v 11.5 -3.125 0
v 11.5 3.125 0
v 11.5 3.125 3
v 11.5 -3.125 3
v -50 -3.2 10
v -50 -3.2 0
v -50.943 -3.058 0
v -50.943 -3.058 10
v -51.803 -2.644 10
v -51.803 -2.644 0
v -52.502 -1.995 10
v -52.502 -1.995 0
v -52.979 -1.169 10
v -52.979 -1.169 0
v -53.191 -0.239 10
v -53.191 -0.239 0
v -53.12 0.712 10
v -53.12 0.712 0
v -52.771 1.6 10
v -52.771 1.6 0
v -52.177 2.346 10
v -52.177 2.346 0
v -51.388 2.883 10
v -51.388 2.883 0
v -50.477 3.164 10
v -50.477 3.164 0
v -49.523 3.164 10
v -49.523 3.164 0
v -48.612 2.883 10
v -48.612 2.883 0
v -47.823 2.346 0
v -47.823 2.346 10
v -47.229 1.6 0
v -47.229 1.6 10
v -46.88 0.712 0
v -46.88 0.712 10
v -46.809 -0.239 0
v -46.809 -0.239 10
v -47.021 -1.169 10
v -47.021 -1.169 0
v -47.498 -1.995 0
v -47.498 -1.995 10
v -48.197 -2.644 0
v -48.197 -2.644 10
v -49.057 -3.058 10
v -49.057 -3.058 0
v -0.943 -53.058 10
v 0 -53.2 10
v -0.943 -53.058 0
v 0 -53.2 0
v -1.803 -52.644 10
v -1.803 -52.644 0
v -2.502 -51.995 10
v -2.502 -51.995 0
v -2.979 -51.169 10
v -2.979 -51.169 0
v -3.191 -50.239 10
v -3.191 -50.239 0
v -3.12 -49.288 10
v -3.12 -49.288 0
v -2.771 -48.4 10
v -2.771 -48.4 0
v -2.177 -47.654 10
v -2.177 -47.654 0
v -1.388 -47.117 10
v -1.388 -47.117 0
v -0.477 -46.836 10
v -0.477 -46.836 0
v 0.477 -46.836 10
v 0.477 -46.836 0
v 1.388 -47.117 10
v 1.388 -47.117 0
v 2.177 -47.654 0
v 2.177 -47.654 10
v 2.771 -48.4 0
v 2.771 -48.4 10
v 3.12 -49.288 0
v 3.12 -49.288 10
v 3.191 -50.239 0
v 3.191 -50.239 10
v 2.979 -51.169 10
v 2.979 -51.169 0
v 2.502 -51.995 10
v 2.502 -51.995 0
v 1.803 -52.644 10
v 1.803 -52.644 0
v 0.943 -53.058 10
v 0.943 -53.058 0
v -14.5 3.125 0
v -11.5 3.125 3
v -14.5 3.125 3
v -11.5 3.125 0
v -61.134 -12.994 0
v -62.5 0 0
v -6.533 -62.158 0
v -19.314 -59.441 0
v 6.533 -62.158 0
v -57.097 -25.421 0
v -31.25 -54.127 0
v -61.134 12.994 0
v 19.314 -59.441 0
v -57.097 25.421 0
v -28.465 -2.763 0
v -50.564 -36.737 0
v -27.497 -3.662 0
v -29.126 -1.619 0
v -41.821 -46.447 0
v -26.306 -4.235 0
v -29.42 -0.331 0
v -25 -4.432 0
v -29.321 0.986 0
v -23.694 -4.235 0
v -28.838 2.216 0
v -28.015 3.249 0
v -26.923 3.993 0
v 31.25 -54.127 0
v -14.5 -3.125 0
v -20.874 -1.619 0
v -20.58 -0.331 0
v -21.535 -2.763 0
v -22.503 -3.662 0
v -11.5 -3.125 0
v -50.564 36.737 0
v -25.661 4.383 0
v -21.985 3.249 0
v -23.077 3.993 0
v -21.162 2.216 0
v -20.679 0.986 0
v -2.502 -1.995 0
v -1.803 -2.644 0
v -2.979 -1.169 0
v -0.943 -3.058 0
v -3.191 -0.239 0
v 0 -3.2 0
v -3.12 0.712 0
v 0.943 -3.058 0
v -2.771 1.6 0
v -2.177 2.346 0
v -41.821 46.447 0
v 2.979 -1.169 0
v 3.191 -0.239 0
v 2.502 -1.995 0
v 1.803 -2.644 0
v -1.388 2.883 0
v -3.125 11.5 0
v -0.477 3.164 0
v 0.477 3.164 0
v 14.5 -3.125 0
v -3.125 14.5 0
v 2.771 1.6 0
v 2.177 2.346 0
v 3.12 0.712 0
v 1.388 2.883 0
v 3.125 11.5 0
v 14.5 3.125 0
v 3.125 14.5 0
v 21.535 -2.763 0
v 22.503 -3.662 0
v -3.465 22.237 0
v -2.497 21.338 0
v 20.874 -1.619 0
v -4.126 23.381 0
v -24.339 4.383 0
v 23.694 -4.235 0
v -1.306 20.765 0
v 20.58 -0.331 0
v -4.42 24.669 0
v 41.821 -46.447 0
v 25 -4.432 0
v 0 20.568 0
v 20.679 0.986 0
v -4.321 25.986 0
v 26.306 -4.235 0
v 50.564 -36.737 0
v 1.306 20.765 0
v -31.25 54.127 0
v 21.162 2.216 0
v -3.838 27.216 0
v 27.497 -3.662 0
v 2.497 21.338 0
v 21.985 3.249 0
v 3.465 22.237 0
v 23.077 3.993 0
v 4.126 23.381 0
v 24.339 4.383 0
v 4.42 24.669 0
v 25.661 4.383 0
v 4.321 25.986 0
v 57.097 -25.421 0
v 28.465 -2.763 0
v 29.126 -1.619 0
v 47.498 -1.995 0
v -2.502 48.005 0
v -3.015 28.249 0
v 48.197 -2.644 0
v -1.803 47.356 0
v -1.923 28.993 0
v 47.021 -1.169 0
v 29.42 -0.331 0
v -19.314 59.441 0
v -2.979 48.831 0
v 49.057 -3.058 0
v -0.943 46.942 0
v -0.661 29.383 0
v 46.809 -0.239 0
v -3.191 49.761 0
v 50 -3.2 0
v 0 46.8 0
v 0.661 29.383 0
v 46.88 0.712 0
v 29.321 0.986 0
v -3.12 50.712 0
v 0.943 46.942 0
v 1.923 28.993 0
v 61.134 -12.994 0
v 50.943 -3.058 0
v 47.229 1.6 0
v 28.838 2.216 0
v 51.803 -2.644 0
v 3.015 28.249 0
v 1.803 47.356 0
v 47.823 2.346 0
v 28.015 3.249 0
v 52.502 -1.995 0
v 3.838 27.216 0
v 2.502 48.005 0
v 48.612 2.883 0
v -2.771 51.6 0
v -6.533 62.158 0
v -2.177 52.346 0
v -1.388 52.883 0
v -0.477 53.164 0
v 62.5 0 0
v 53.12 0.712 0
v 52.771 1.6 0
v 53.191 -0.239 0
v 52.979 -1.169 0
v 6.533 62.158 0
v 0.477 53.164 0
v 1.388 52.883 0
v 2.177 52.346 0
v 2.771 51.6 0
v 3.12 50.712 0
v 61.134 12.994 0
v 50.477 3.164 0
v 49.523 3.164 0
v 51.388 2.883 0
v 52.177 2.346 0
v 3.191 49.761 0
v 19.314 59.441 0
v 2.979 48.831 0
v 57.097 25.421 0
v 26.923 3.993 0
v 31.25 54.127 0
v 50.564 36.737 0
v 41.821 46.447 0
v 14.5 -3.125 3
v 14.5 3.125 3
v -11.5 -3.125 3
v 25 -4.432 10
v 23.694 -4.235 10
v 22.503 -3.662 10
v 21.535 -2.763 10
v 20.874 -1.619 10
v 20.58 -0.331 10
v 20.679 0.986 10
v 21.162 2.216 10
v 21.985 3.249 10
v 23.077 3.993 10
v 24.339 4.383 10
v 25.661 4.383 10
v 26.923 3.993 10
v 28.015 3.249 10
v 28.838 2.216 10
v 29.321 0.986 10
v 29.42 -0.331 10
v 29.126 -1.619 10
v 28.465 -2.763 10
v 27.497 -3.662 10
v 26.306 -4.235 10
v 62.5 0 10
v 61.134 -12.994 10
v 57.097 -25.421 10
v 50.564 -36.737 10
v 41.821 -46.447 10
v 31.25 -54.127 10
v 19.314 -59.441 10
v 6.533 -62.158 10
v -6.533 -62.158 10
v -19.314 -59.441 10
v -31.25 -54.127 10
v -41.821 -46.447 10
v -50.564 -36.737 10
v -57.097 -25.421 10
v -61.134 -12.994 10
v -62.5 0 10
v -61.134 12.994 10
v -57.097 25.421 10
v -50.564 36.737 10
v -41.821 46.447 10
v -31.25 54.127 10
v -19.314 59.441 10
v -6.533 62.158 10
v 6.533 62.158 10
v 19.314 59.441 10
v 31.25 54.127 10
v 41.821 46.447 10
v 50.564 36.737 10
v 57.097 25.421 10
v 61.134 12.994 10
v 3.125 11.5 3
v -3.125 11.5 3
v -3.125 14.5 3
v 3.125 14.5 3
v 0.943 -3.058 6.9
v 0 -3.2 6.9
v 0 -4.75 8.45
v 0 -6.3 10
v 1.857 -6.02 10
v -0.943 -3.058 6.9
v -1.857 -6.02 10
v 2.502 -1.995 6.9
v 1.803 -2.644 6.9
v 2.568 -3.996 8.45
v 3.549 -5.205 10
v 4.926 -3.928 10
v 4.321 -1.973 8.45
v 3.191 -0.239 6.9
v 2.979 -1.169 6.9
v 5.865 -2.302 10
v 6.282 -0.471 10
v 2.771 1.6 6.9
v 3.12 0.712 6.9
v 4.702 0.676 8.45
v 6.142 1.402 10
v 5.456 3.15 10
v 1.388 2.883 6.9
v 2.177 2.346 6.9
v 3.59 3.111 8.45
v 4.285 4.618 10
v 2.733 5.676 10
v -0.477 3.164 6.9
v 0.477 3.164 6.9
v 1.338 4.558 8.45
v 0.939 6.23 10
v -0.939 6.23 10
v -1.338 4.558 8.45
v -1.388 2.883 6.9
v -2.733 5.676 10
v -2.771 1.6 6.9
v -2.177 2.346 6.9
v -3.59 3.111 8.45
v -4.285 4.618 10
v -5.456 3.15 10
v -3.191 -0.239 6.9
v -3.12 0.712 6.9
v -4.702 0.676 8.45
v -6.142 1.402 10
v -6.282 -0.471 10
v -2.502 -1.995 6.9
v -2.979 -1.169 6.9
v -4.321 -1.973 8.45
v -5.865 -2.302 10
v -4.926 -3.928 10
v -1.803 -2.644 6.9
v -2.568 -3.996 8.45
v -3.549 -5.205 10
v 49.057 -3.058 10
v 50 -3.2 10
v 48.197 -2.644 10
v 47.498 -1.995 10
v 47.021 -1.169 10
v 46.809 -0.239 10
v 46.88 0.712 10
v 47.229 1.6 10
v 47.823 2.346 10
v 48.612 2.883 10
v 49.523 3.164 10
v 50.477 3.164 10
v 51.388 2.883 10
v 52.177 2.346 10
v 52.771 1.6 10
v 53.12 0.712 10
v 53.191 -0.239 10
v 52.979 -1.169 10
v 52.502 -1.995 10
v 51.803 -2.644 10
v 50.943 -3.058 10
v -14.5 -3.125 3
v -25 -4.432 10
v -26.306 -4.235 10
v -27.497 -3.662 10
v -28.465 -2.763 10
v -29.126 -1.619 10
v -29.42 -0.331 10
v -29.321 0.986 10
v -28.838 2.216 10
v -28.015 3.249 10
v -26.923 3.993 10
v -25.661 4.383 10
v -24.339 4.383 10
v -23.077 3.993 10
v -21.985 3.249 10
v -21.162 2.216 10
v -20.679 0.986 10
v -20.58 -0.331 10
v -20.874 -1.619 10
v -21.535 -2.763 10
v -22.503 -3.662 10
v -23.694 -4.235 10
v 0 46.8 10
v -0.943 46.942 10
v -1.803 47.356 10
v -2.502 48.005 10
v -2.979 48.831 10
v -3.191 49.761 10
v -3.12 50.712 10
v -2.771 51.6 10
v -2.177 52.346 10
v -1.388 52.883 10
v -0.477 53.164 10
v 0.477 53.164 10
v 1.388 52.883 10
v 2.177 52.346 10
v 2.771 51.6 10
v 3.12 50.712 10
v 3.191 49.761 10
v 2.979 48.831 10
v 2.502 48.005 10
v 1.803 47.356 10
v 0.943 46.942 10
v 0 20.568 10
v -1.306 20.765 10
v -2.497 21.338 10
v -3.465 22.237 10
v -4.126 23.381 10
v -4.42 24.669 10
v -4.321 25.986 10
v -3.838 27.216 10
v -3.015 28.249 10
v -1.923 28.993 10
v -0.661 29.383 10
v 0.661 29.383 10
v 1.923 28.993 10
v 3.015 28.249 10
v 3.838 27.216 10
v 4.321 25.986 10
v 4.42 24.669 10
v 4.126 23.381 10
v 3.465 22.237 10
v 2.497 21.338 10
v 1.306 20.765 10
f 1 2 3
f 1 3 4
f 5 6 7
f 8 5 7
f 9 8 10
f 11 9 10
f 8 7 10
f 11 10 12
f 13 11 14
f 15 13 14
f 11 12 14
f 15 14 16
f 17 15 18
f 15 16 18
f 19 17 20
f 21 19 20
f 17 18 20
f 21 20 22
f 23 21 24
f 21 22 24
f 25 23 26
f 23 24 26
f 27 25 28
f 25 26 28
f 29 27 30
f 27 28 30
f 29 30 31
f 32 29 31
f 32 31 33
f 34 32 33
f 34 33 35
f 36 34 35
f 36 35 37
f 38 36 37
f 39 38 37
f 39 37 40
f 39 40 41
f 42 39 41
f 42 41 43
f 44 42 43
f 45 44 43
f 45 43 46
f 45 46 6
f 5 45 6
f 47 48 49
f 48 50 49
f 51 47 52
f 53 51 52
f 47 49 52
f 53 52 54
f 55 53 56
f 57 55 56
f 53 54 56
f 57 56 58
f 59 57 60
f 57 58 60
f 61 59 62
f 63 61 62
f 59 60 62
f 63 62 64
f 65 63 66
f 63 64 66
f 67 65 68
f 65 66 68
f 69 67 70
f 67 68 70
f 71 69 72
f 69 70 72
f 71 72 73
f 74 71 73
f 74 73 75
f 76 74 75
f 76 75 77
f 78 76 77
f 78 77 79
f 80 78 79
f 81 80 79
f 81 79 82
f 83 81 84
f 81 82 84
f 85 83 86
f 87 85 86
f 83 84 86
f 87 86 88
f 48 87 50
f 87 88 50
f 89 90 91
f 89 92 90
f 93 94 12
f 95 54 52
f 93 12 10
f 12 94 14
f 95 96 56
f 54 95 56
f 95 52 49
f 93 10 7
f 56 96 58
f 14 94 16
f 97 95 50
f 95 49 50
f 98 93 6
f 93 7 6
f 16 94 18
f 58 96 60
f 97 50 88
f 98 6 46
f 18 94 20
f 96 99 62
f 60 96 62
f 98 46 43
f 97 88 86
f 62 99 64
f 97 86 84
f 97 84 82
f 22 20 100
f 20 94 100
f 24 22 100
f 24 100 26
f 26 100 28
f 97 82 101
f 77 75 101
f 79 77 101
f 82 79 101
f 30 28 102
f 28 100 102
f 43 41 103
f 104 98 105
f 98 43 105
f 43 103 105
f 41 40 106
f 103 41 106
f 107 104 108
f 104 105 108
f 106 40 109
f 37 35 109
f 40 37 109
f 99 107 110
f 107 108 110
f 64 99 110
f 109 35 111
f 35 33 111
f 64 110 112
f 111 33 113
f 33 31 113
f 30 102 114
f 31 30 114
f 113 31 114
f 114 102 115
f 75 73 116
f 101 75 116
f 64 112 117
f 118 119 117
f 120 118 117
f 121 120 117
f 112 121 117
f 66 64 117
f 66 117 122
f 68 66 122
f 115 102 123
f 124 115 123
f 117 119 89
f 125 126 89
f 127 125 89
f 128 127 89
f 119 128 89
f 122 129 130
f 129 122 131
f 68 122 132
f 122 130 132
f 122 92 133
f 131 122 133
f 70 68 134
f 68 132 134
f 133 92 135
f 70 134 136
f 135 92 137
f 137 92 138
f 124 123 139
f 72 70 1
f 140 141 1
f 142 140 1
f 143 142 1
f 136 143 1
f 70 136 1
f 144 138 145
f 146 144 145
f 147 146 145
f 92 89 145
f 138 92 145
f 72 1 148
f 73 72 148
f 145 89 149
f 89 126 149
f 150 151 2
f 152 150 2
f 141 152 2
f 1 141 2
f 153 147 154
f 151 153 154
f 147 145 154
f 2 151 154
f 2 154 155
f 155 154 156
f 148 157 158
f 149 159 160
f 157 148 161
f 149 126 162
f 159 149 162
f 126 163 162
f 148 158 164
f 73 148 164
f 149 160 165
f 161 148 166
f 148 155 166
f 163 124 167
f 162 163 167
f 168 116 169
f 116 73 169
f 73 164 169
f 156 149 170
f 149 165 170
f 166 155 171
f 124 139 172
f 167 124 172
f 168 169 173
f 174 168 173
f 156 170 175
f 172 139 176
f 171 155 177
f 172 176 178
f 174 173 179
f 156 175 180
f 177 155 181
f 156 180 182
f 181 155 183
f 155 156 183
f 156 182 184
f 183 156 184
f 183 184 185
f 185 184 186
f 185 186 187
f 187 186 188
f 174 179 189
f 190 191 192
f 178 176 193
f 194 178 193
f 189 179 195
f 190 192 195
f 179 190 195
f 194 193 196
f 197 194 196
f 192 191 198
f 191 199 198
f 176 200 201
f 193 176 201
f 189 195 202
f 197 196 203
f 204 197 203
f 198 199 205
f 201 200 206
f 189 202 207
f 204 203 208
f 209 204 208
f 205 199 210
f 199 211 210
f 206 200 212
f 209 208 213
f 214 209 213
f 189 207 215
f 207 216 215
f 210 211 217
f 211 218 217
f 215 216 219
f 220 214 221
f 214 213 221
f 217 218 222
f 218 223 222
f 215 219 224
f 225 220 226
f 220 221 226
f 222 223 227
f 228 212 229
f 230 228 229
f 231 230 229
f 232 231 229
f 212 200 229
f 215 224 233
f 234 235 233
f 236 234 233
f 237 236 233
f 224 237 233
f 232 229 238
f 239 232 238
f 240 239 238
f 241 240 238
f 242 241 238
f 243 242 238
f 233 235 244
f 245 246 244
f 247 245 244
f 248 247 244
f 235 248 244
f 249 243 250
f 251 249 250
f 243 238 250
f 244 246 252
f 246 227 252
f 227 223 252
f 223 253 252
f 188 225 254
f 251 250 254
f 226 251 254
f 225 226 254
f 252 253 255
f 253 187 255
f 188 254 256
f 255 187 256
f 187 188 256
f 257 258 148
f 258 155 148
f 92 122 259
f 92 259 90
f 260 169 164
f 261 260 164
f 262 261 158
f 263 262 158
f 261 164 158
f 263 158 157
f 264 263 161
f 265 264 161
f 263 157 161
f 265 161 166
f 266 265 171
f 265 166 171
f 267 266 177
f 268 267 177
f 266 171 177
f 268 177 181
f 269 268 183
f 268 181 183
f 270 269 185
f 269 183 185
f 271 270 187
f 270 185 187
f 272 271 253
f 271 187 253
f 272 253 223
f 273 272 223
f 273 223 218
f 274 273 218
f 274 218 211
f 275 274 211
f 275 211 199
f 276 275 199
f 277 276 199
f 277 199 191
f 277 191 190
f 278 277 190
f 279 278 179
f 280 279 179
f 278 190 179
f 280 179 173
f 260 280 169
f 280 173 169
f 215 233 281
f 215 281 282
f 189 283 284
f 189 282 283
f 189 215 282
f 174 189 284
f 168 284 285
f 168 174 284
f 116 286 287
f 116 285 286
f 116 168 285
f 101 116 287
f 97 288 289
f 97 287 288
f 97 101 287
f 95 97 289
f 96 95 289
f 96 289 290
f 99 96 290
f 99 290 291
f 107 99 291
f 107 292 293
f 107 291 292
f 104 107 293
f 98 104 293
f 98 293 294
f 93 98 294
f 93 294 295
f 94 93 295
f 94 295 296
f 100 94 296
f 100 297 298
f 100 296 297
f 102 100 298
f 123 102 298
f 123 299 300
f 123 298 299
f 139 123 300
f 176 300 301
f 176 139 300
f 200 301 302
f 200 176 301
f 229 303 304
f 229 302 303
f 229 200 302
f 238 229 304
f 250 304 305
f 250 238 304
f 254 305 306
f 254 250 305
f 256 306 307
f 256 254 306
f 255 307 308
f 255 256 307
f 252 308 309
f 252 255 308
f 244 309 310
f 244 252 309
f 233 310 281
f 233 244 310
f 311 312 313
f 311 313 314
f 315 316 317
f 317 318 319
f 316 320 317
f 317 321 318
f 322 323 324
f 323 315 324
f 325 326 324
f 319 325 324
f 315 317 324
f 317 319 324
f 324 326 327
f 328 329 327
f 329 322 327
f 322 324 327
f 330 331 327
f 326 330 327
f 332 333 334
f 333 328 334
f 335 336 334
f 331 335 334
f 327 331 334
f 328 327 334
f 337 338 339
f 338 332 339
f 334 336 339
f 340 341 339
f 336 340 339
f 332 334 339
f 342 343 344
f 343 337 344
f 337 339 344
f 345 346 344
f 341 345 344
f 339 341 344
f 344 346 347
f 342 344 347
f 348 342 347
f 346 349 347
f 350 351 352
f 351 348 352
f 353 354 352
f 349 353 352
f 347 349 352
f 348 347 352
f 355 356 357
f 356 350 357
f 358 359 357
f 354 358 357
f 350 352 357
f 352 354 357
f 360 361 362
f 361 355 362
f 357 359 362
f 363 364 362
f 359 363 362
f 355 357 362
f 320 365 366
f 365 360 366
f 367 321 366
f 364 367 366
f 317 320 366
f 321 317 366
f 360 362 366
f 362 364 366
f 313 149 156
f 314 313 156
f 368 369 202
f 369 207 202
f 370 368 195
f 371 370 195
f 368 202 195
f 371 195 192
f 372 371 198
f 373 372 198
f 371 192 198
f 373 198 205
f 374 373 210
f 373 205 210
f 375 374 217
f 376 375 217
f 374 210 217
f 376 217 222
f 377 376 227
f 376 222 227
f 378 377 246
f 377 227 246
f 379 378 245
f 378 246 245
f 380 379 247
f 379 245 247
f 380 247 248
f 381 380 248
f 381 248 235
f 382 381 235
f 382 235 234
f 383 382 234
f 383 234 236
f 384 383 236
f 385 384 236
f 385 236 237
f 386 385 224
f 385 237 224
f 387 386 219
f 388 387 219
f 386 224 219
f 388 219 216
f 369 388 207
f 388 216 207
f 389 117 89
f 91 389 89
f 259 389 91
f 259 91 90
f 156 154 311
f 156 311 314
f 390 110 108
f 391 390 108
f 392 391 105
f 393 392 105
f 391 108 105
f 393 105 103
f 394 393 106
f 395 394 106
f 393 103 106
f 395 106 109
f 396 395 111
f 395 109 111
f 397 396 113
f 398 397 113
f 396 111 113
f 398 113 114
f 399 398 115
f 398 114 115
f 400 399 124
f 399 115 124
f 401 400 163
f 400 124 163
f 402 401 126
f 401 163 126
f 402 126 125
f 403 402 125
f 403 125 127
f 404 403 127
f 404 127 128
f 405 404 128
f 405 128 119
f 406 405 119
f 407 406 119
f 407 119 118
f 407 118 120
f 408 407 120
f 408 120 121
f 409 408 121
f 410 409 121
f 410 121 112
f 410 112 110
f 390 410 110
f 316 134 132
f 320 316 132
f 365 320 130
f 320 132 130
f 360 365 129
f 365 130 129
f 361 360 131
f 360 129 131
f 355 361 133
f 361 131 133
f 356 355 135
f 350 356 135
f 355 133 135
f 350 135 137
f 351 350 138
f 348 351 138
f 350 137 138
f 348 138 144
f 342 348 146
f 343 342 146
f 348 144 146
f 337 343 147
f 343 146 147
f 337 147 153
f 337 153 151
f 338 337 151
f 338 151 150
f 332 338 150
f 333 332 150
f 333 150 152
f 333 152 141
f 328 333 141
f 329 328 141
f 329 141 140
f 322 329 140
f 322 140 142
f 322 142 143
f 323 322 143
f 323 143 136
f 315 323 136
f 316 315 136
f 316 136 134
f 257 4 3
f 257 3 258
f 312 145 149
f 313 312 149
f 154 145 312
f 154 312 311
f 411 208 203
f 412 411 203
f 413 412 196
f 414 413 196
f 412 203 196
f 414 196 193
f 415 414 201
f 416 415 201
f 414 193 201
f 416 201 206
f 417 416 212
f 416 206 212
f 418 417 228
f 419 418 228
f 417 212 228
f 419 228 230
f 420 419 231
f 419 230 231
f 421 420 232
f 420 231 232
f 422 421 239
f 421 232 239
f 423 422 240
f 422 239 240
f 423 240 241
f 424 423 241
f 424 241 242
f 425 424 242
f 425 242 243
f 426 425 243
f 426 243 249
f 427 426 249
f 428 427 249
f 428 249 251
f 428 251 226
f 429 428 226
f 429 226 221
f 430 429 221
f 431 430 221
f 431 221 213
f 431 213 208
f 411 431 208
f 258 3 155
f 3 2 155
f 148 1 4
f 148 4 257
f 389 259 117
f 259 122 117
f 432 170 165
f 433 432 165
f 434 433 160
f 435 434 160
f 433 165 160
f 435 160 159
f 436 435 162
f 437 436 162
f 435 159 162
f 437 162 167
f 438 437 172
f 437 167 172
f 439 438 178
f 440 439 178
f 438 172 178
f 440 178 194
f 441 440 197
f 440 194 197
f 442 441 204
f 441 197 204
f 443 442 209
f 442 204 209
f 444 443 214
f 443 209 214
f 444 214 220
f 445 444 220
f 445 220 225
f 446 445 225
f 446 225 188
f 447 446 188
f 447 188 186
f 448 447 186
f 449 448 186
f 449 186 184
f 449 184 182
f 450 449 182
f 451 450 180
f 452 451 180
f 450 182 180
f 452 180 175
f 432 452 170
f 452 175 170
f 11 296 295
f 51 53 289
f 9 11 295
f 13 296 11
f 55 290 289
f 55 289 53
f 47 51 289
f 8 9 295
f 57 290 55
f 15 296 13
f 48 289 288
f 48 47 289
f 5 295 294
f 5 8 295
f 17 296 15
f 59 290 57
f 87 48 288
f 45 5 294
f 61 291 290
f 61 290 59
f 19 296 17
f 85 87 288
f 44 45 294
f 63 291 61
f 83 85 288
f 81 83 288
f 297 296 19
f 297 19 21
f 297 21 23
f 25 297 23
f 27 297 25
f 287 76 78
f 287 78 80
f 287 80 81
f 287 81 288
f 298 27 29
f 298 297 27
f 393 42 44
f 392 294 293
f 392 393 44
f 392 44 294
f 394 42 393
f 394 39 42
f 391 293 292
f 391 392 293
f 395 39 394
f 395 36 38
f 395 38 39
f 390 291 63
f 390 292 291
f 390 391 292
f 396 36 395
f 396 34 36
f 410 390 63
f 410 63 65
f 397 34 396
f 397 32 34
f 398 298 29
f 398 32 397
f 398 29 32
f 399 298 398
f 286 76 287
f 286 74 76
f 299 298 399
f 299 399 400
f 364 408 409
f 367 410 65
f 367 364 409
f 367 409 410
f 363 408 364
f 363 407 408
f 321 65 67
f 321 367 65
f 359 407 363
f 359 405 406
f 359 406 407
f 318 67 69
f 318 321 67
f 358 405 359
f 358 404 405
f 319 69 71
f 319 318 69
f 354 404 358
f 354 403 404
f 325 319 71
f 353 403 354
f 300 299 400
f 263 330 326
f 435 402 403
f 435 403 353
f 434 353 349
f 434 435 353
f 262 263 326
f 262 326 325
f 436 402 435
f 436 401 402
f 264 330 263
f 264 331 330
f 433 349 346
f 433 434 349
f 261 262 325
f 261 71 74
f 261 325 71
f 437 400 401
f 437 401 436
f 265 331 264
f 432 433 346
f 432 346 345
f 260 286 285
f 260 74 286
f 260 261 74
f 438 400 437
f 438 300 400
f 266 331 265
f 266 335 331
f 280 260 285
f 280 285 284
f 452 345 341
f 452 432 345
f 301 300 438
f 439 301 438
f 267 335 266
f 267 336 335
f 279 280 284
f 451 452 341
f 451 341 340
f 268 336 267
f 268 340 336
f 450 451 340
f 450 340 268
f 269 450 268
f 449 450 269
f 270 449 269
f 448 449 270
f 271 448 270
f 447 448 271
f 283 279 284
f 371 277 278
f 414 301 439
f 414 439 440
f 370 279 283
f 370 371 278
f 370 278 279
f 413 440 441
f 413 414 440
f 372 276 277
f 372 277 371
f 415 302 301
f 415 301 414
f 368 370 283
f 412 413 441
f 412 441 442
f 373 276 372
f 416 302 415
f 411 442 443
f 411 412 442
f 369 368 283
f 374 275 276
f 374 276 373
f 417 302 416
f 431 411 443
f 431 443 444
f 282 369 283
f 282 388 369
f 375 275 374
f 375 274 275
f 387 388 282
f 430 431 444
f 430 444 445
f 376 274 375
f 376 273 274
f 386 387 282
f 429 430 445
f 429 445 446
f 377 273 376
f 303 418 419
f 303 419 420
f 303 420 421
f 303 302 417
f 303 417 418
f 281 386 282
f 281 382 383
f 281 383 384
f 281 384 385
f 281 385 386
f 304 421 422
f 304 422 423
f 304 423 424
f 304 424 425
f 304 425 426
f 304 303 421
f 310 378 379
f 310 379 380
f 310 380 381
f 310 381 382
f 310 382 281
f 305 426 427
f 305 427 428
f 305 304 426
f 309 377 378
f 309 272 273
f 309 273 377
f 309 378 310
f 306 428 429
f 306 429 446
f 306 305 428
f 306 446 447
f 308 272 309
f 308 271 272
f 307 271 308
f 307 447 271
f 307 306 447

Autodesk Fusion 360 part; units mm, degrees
sketch "Sketch3" plane through (0, 0, 0) normal (0, 0, 1) x (1, 0, 0)
  circle A0 centre (0, 0) radius 62.5
  dimension "d12" = 125
extrude "Extrude2" add sketch "Sketch3" along normal blind 10
sketch "Sketch4" plane through (0, 0, 10) normal (0, 0, 1) x (-1, 0, 0)
  circle A0 centre (0, 0) radius 62.5
  line L0 (0, 0) -> (0, -25)
  line L1 (0, -25) -> (0, -50)
  line L2 (0, 0) -> (25, 0)
  line L3 (25, 0) -> (50, 0)
  line L4 (0, 0) -> (-25, 0)
  line L5 (-25, 0) -> (-50, 0)
  line L6 (0, 0) -> (0, 25)
  line L7 (0, 25) -> (0, 50)
  point P0 (-25, 0)
  point P1 (25, 0)
  point P2 (0, -25)
  point P3 (0, -50)
  point P4 (-50, 0)
  point P5 (50, 0)
  point P6 (0, 50)
  point P7 (0, 25)
  dimension "d15" = 25
hole "Hole2" at (25, 0, 10) at (-25, 0, 10) at (0, 25, 10) direction (0, 0, -1) diameter 8.8646 end through all
hole "Hole3" at (0, 50, 10) at (50, 0, 10) at (0, -50, 10) at (-50, 0, 10) direction (0, 0, -1) diameter 6.4 end through all
hole "Hole4" at (0, 0, 10) direction (0, 0, -1) diameter 6.4 end through all countersink diameter 12.6 countersink angle 90
sketch "Sketch5" plane through (0, 0, 0) normal (0, 0, -1) x (1, 0, 0)
  circle A0 centre (0, 0) radius 3.2
  circle A1 centre (0, 50) radius 3.2
  circle A2 centre (0, -50) radius 3.2
  circle A3 centre (50, 0) radius 3.2
  circle A4 centre (-50, 0) radius 3.2
  circle A5 centre (25, 0) radius 4.4323
  circle A6 centre (-25, 0) radius 4.4323
  circle A7 centre (0, 0) radius 62.5
  line L0 (0, 0) -> (11.5, 0) construction
  line L1 (11.5, 0) -> (14.5, 0) construction
  line L2 (11.5, -3.125) -> (14.5, -3.125)
  line L3 (11.5, 3.125) -> (14.5, 3.125)
  line L4 (14.5, -3.125) -> (14.5, 3.125)
  line L5 (11.5, -3.125) -> (11.5, 3.125)
  circle A8 centre (0, -25) radius 4.4323
  line L6 (3.125, 11.5) -> (-3.125, 11.5)
  line L7 (3.125, 14.5) -> (-3.125, 14.5)
  line L8 (-3.125, 11.5) -> (-3.125, 14.5)
  line L9 (0, 11.5) -> (0, 14.5) construction
  line L10 (3.125, 11.5) -> (3.125, 14.5)
  line L11 (0, 0) -> (0, 11.5) construction
  line L12 (-11.5, 3.125) -> (-11.5, -3.125)
  line L13 (-14.5, 3.125) -> (-14.5, -3.125)
  line L14 (-11.5, -3.125) -> (-14.5, -3.125)
  line L15 (-11.5, 0) -> (-14.5, 0) construction
  line L16 (-11.5, 3.125) -> (-14.5, 3.125)
  line L17 (0, 0) -> (-11.5, 0) construction
  line L18 (-3.125, -11.5) -> (3.125, -11.5)
  line L19 (-3.125, -14.5) -> (3.125, -14.5)
  line L20 (3.125, -11.5) -> (3.125, -14.5)
  line L21 (0, -11.5) -> (0, -14.5) construction
  line L22 (-3.125, -11.5) -> (-3.125, -14.5)
  line L23 (0, 0) -> (0, -11.5) construction
  point P0 (0, 25)
  point P1 (-25, 0)
  point P2 (0, -25)
  dimension "d28" = 3
  dimension "d29" = 11.5
  dimension "d30" = 3.125
  dimension "d31" = -3.125
  dimension "d37" = 360
extrude "Extrude3" cut sketch "Sketch5" against normal blind 3 contours L2 L3 L4 L5 | L12 L13 L14 L16 | L18 L19 L20 L22
equation "thickness = 15 mm"
equation "height = 60 mm"
equation "hole_hole_dist = 25 mm"
equation "d30 = ( 6.25 / 2 ) * 1 mm"
equation "d31 = -d30"
